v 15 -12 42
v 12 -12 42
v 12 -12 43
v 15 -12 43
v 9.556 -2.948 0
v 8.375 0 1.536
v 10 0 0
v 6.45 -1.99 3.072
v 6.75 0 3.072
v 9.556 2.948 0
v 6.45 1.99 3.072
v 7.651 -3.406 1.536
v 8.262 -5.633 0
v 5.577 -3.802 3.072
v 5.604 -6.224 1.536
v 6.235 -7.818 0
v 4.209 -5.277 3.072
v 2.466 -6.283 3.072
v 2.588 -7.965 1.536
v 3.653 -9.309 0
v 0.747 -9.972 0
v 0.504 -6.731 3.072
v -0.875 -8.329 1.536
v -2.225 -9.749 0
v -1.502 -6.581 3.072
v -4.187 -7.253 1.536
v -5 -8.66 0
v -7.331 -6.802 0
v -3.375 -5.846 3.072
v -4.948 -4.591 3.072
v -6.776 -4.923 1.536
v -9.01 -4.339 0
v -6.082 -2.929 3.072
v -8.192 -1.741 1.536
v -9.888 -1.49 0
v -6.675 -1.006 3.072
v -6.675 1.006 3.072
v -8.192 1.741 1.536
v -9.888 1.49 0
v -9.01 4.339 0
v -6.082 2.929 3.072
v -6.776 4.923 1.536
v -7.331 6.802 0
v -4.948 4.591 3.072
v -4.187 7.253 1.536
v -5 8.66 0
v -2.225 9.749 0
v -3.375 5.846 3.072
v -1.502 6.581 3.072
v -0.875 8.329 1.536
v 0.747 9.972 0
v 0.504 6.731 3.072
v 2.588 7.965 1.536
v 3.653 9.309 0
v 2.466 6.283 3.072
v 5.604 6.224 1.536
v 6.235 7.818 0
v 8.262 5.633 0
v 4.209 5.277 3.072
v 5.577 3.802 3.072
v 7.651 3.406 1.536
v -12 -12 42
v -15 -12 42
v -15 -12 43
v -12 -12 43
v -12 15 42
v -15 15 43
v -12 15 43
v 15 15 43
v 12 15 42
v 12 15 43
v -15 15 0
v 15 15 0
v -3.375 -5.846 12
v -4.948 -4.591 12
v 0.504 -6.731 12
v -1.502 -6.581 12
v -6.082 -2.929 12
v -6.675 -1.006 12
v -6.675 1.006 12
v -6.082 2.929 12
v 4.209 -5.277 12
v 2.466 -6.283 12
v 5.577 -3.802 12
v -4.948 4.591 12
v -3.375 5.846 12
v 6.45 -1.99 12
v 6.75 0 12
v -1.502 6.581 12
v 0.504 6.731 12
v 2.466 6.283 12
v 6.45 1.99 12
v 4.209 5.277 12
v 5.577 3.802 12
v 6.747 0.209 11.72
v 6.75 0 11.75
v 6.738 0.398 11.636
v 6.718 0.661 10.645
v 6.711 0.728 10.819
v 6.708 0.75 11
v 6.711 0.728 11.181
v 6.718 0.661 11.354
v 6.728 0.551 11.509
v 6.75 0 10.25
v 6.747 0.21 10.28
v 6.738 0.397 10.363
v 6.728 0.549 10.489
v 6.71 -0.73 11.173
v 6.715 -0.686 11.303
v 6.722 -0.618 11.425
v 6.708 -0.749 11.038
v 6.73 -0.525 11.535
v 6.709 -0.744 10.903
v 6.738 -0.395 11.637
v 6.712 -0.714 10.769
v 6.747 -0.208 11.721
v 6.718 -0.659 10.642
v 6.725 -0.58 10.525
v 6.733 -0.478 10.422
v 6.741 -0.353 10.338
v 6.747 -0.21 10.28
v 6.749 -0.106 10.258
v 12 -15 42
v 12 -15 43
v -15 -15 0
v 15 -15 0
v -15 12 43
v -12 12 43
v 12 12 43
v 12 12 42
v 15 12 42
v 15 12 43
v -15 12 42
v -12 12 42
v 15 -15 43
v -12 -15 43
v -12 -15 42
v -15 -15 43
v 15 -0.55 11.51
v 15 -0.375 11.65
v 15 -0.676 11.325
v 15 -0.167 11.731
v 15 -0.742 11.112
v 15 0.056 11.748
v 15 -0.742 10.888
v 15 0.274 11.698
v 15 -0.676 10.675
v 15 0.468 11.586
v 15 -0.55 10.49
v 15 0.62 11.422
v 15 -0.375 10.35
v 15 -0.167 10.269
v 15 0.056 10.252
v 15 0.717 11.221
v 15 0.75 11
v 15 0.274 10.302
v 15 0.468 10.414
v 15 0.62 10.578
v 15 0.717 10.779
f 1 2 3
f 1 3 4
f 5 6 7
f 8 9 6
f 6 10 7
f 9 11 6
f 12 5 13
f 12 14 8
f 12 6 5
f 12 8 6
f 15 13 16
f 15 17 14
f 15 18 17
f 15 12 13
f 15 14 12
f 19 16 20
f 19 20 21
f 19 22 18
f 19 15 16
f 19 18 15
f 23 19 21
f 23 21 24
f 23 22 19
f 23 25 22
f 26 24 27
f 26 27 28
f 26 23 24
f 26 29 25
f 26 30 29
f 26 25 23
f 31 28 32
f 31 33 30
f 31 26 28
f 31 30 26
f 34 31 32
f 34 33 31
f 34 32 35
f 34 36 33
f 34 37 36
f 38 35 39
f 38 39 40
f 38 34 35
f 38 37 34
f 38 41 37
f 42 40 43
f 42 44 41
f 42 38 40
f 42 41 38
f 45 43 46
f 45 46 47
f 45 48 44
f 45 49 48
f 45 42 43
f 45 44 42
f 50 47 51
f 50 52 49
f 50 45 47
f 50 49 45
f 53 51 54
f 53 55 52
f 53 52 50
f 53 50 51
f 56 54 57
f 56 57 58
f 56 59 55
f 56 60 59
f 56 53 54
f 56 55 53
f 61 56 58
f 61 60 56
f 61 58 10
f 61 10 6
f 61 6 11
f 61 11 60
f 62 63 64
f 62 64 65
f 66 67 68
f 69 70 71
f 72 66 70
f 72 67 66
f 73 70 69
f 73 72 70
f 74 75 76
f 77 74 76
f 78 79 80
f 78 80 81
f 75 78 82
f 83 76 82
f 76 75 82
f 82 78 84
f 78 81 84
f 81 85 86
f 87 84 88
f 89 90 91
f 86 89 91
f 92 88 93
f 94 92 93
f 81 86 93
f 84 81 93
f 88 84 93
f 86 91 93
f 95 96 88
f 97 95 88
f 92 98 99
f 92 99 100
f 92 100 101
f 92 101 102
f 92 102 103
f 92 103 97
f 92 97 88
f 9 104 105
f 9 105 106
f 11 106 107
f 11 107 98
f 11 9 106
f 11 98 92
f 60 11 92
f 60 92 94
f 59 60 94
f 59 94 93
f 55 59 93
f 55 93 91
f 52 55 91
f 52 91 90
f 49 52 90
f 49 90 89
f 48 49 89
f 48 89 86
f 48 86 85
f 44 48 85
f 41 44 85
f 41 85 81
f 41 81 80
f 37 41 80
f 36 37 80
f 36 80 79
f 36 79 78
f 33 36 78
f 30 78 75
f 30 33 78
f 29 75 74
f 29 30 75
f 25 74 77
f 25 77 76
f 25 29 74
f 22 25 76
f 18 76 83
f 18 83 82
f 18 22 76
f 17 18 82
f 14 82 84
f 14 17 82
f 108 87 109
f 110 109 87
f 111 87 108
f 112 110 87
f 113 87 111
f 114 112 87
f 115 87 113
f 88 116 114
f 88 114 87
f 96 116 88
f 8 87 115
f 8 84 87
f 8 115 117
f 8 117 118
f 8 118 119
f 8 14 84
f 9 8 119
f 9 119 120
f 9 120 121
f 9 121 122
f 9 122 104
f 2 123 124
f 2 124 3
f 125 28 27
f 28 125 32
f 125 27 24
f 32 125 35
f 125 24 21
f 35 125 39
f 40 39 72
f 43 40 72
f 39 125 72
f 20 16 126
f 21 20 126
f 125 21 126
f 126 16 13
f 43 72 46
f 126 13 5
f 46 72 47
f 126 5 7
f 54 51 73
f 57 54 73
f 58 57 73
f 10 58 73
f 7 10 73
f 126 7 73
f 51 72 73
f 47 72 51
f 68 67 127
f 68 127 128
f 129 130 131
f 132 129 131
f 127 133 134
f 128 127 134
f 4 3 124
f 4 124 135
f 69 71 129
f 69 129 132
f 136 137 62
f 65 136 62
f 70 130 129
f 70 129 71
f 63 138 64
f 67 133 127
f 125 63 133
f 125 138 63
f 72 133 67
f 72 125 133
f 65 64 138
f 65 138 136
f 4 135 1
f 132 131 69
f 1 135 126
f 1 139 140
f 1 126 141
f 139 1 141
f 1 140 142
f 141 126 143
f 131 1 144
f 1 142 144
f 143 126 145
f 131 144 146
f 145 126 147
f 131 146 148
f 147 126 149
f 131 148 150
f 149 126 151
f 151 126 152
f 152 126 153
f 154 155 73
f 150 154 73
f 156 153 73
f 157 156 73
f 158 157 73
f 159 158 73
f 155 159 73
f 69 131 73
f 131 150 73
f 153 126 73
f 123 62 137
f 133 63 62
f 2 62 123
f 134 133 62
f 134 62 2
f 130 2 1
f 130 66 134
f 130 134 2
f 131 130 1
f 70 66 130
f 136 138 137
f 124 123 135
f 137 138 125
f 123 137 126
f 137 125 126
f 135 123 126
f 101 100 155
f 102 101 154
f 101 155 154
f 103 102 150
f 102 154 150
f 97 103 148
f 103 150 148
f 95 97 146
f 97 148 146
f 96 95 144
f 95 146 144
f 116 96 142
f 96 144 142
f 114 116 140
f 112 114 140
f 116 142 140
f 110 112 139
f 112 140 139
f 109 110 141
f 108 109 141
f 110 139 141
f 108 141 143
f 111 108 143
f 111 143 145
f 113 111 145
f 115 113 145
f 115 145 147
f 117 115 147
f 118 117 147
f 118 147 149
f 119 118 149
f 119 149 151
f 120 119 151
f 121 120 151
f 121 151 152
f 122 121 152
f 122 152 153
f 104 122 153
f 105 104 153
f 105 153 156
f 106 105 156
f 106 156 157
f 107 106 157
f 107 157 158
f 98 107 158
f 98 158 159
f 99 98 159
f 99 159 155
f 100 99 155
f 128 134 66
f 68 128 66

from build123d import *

# Parameters (mm, degrees)
F0_W     = 30
F0_H     = 30
F1_DEPTH = 42
F2_R     = 6.75
F3_DEPTH = 12
F6_W     = 3
F6_H     = 3
F7_DEPTH = 1
F8_R     = 0.75
F9_DEPTH = 8.2927961675


with BuildPart() as f1:
    # F0 (on Top) → F1 (new body)
    with BuildSketch(Plane.XY):
        Rectangle(F0_W, F0_H)
    extrude(amount=F1_DEPTH)

    # F2 (on Top) → F3 (cut)
    with BuildSketch(Plane.XY):
        Circle(F2_R)
    extrude(amount=F3_DEPTH, mode=Mode.SUBTRACT)

    # F4 (on Front) → F5 (revolve, cut)
    with BuildSketch(Plane.XZ):
        Polygon((0, 9.4530368224), (0, 0), (10, 0), align=None)
    revolve(axis=Axis((0, 0, 4.7265184112), (0, 0, -1)), mode=Mode.SUBTRACT)

    # F6 (on face) → F7 (join)
    with BuildSketch(Plane.XY.offset(42)):
        with Locations((-13.5, 13.5)):
            Rectangle(F6_W, F6_H)
        with Locations((13.5, 13.5)):
            Rectangle(F6_W, F6_H)
        with Locations((13.5, -13.5)):
            Rectangle(F6_W, F6_H)
        with Locations((-13.5, -13.5)):
            Rectangle(F6_W, F6_H)
    extrude(amount=F7_DEPTH)

    # F8 (on face) → F9 (cut, through all)
    with BuildSketch(Plane.YZ.offset(15)):
        with Locations((0, 11)):
            Circle(F8_R)
    extrude(amount=-F9_DEPTH, mode=Mode.SUBTRACT)


solid = f1.part
